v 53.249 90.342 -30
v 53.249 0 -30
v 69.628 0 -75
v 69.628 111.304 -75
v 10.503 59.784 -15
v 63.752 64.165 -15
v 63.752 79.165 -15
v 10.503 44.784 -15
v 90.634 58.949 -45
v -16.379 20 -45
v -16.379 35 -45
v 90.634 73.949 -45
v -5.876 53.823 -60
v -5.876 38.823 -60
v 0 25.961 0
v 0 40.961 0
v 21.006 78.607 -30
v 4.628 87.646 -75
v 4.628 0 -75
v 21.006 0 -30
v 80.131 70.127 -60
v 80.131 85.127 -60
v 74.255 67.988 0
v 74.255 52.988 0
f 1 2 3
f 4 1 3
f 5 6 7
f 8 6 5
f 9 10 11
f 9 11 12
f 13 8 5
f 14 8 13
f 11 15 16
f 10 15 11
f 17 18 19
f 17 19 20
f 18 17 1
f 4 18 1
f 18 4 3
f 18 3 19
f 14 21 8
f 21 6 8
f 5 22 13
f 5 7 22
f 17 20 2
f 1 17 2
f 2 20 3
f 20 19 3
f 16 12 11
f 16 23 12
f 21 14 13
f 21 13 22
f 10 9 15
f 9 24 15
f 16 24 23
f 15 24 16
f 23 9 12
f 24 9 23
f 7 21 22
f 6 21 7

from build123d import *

# Parameters (mm, degrees)
EXTRUDE1_DEPTH     = 111.30370628
CUT_EXTRUDE1_DEPTH = 46
SKETCH4_W          = 93.704770794
SKETCH4_H          = 56.784227463
CUT_EXTRUDE2_DEPTH = 111.30370628
EXTRUDE2_DEPTH     = 111.30370628
SKETCH11_W         = 148.9717492
SKETCH11_H         = 56.952864623
CUT_EXTRUDE3_DEPTH = 60
SKETCH12_W         = 149.677776447
SKETCH12_H         = 58.364919118
CUT_EXTRUDE4_DEPTH = 80
EXTRUDE3_DEPTH     = 90
SKETCH14_W         = 111.854252755
SKETCH14_H         = 53.467616039
CUT_EXTRUDE5_DEPTH = 40
SKETCH15_W         = 126.852412542
SKETCH15_H         = 52.398263719
CUT_EXTRUDE6_DEPTH = 70


with BuildPart() as part:
    # Sketch1 → Extrude1 (new body)
    with BuildSketch(Plane(origin=(0, 0, 0), x_dir=(1, 0, 0), z_dir=(0, 1, 0))):
        Polygon((21.0062615, 30), (53.24890506, 30), (69.6275656, 75), (4.6275656, 75), align=None)
    extrude(amount=EXTRUDE1_DEPTH)

    # Sketch2 → Cut-Extrude1 (cut, through all)
    with BuildSketch(Plane.XY.offset(-30)):
        Polygon((69.6275656, 111.30370628), (4.6275656, 111.30370628), (4.6275656, 87.645641053), align=None)
    extrude(amount=-CUT_EXTRUDE1_DEPTH, mode=Mode.SUBTRACT)

    # Sketch4 → Cut-Extrude2 (cut)
    with BuildSketch(Plane(origin=(-17.842051082, 49.020632465, 16.340210822), x_dir=(0.945237473, 0.309634474, 0.103211491), z_dir=(0.326383393, -0.896731003, -0.298910334))):
        with Locations((55.789149016, -81.366436022)):
            Rectangle(SKETCH4_W, SKETCH4_H)
    extrude(amount=-CUT_EXTRUDE2_DEPTH, mode=Mode.SUBTRACT)


with BuildPart() as body_2:
    # Sketch6 → Extrude2 (new body)
    with BuildSketch(Plane(origin=(0, 0, 0), x_dir=(1, 0, 0), z_dir=(0, 1, 0))):
        Polygon((-16.3786959, 45), (90.633791747, 45), (74.255131207, 0), (0, 0), align=None)
    extrude(amount=EXTRUDE2_DEPTH)

    # Sketch11 → Cut-Extrude3 (cut)
    with BuildSketch(Plane(origin=(-8.343815422, 22.924444463, 0), x_dir=(-0.939692621, -0.342020143, 0), z_dir=(-0.342020143, 0.939692621, 0))):
        with Locations((-52.925432522, -24.484117378)):
            Rectangle(SKETCH11_W, SKETCH11_H)
    extrude(amount=-CUT_EXTRUDE3_DEPTH, mode=Mode.SUBTRACT)

    # Sketch12 → Cut-Extrude4 (cut)
    with BuildSketch(Plane(origin=(-13.164722494, 36.169777787, 0), x_dir=(-0.939692621, -0.342020143, 0), z_dir=(-0.342020143, 0.939692621, 0))):
        with Locations((-55.867212719, -21.895350804)):
            Rectangle(SKETCH12_W, SKETCH12_H)
    extrude(amount=CUT_EXTRUDE4_DEPTH, mode=Mode.SUBTRACT)


with BuildPart() as body_3:
    # Sketch13 → Extrude3 (new body)
    with BuildSketch(Plane(origin=(0, 0, 0), x_dir=(1, 0, 0), z_dir=(0, 1, 0))):
        Polygon((-5.875590582, 60), (80.130678674, 60), (63.752018134, 15), (10.503105318, 15), align=None)
    extrude(amount=EXTRUDE3_DEPTH)

    # Sketch14 → Cut-Extrude5 (cut)
    with BuildSketch(Plane(origin=(-17.985629567, 49.41511111, 0), x_dir=(-0.939692621, -0.342020143, 0), z_dir=(-0.342020143, 0.939692621, 0))):
        with Locations((-60.555614074, -40.410095572)):
            Rectangle(SKETCH14_W, SKETCH14_H)
    extrude(amount=CUT_EXTRUDE5_DEPTH, mode=Mode.SUBTRACT)

    # Sketch15 → Cut-Extrude6 (cut)
    with BuildSketch(Plane(origin=(-13.164722494, 36.169777787, 0), x_dir=(-0.939692621, -0.342020143, 0), z_dir=(-0.342020143, 0.939692621, 0))):
        with Locations((-55.409109287, -38.592196628)):
            Rectangle(SKETCH15_W, SKETCH15_H)
    extrude(amount=-CUT_EXTRUDE6_DEPTH, mode=Mode.SUBTRACT)


solid = Compound([part.part, body_2.part, body_3.part])
